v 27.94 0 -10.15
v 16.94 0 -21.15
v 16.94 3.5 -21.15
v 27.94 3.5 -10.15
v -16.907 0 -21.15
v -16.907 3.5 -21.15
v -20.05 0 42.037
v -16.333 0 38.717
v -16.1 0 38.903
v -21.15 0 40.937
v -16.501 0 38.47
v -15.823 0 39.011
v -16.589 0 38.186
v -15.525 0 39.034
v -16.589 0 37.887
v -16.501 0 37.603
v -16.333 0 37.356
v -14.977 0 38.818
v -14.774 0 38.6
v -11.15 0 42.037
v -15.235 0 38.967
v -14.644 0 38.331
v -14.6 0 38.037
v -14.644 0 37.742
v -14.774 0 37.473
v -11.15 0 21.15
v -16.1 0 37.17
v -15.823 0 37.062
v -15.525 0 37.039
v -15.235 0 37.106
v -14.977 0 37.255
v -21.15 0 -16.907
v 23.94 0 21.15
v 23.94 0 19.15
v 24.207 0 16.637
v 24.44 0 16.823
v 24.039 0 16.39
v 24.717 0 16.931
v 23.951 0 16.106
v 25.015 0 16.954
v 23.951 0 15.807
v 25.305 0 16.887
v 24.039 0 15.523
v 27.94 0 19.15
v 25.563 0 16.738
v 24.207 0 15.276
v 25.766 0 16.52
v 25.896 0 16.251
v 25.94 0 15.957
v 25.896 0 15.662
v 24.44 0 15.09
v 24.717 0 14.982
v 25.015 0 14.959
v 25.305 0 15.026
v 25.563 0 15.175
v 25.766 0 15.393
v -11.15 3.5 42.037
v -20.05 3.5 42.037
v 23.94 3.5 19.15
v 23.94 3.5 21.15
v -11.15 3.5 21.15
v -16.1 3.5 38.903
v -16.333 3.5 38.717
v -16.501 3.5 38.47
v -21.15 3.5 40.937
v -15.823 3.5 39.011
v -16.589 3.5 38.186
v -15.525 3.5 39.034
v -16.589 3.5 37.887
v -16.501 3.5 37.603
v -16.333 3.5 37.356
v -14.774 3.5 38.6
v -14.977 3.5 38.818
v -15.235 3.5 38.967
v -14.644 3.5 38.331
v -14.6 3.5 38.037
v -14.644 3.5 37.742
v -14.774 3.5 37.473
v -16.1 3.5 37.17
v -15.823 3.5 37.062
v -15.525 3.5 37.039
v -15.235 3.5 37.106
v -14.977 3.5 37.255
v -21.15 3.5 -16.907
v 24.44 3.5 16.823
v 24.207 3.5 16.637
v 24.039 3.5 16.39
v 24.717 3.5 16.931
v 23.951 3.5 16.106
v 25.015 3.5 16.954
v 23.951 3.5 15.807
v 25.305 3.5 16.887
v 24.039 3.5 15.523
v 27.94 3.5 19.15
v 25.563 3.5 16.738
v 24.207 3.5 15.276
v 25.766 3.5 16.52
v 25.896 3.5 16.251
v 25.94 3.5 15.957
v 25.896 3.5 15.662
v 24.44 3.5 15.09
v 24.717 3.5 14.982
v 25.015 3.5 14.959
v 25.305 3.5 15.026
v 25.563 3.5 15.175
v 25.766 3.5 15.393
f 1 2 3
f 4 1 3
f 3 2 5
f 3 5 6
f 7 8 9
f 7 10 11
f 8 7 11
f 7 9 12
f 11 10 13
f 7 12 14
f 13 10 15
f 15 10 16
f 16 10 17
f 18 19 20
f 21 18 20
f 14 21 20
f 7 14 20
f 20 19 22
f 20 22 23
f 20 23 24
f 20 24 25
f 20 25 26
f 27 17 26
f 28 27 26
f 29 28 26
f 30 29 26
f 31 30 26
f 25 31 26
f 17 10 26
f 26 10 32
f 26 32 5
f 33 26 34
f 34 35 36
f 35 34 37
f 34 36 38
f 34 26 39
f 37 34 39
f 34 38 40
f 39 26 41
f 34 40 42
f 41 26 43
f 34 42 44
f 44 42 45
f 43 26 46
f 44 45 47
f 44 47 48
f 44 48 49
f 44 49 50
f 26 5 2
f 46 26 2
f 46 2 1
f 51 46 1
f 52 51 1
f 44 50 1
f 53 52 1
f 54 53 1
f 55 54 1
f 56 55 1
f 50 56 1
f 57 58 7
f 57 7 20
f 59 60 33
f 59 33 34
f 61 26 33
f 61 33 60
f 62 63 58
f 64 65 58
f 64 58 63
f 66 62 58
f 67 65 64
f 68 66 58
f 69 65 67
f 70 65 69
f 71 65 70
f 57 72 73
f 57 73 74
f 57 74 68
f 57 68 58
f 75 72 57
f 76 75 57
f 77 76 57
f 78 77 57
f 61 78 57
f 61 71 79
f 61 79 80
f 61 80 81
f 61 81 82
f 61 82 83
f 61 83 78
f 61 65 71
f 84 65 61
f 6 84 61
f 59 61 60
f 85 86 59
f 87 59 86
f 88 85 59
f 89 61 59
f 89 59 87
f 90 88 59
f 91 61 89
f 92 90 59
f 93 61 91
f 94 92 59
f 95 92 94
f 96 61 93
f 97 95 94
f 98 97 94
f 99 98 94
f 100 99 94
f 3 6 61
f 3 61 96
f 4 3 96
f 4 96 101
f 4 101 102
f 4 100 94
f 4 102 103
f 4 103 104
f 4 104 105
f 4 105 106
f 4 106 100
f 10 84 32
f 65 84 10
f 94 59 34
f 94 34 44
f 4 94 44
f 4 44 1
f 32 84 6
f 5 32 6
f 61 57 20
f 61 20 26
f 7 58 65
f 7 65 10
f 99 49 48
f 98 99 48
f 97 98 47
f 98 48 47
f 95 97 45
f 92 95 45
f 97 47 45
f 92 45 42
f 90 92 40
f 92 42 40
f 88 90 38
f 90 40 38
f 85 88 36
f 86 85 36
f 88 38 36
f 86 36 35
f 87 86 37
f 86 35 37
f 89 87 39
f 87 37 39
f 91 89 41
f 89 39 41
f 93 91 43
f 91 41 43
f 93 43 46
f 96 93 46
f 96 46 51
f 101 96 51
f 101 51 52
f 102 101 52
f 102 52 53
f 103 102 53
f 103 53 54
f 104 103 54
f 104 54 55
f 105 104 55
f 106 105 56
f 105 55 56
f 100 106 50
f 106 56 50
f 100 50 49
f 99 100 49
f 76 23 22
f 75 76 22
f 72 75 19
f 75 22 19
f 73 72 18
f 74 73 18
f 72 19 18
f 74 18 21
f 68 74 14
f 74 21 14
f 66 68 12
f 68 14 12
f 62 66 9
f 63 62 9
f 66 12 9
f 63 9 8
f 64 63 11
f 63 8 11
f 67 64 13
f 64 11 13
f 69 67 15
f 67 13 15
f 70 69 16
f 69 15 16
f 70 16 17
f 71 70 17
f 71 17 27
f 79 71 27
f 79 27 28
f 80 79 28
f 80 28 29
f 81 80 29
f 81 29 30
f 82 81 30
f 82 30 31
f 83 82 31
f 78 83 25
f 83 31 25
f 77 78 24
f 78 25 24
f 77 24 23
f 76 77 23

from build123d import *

# Parameters (mm, degrees)
SKETCH1_W                = 42.3
SKETCH1_H                = 42.3
BOSS_EXTRUDE1_DEPTH      = 3.5
CUT_EXTRUDE1_DEPTH       = 3.5
CIRPATTERN1_COUNT        = 4
SKETCH5_W                = 42.3
SKETCH5_H                = 3.5
BOSS_EXTRUDE3_DEPTH      = 6.79
BOSS_EXTRUDE3_DEPTH_BACK = 6.79
CUT_EXTRUDE2_REACH       = 5.5
SKETCH6_W                = 4
SKETCH6_H                = 2
BOSS_EXTRUDE4_DEPTH      = 3.5
CHAMFER1_SIZE            = 1.1
SKETCH8_R                = 1
CUT_EXTRUDE3_DEPTH       = 3.5
CHAMFER2_SIZE            = 11
SKETCH10_R               = 1
CUT_EXTRUDE4_DEPTH       = 3.5


with BuildPart() as part:
    # Sketch1 → Boss-Extrude1 (new body)
    with BuildSketch(Plane(origin=(0, 0, 0), x_dir=(1, 0, 0), z_dir=(0, 1, 0))):
        Rectangle(SKETCH1_W, SKETCH1_H)
    extrude(amount=BOSS_EXTRUDE1_DEPTH)

    # Sketch2 → Cut-Extrude1 (cut)
    with BuildSketch(Plane(origin=(0, 3.5, 0), x_dir=(1, 0, 0), z_dir=(0, 1, 0))):
        Polygon((-21.15, 16.907359313), (-16.907359313, 21.15), (-21.15, 21.15), align=None)
    cut_extrude1 = extrude(amount=-CUT_EXTRUDE1_DEPTH, mode=Mode.SUBTRACT)

    # CirPattern1: Cut-Extrude1 ×4 about axis
    cirpattern1_axis = Axis((0, 0, 0), (0, 1, 0))
    for i in range(1, CIRPATTERN1_COUNT):
        add(cut_extrude1.rotate(cirpattern1_axis, i * 360 / CIRPATTERN1_COUNT), mode=Mode.SUBTRACT)

    # Sketch5 → Boss-Extrude3 (add, two sides)
    with BuildSketch(Plane(origin=(21.15, 0, 0), x_dir=(0, 0, -1), z_dir=(1, 0, 0))) as boss_extrude3_sk:
        with Locations((0, 1.75)):
            Rectangle(SKETCH5_W, SKETCH5_H)
    extrude(amount=BOSS_EXTRUDE3_DEPTH)
    extrude(boss_extrude3_sk.sketch, amount=-BOSS_EXTRUDE3_DEPTH_BACK)

    # Sketch6 → Cut-Extrude2 (cut, up to next)
    with BuildSketch(Plane(origin=(0, 3.5, 0), x_dir=(1, 0, 0), z_dir=(0, 1, 0)), mode=Mode.PRIVATE) as cut_extrude2_sk1:
        with Locations((25.94, -20.15)):
            Rectangle(SKETCH6_W, SKETCH6_H)
    cut_extrude2_tool1 = extrude(cut_extrude2_sk1.sketch, amount=-CUT_EXTRUDE2_REACH, mode=Mode.PRIVATE) & part.part
    add(cut_extrude2_tool1.solids().sort_by_distance((25.94, 3.5, 20.15))[0], mode=Mode.SUBTRACT)

    # Sketch7 → Boss-Extrude4 (add)
    with BuildSketch(Plane(origin=(0, 3.5, 0), x_dir=(1, 0, 0), z_dir=(0, 1, 0))):
        Polygon((-21.15, -16.907359313), (-21.15, -42.036504825), (-11.15, -42.036504825), (-11.15, -21.15), (-16.907359313, -21.15), align=None)
    extrude(amount=-BOSS_EXTRUDE4_DEPTH)

    # Chamfer1
    chamfer1_edges = [part.edges().sort_by_distance(p)[0] for p in [
        (-21.15, 1.75, 42.036504825),
    ]]
    chamfer(chamfer1_edges, length=CHAMFER1_SIZE)

    # Sketch8 → Cut-Extrude3 (cut)
    with BuildSketch(Plane.XZ):
        with Locations((-15.6, 38.036504825)):
            Circle(SKETCH8_R)
    extrude(amount=-CUT_EXTRUDE3_DEPTH, mode=Mode.SUBTRACT)

    # Chamfer2
    chamfer2_edges = [part.edges().sort_by_distance(p)[0] for p in [
        (27.94, 1.75, -21.15),
    ]]
    chamfer(chamfer2_edges, length=CHAMFER2_SIZE)

    # Sketch10 → Cut-Extrude4 (cut)
    with BuildSketch(Plane.XZ):
        with Locations((24.94, 15.956504825)):
            Circle(SKETCH10_R)
    extrude(amount=-CUT_EXTRUDE4_DEPTH, mode=Mode.SUBTRACT)


solid = part.part
